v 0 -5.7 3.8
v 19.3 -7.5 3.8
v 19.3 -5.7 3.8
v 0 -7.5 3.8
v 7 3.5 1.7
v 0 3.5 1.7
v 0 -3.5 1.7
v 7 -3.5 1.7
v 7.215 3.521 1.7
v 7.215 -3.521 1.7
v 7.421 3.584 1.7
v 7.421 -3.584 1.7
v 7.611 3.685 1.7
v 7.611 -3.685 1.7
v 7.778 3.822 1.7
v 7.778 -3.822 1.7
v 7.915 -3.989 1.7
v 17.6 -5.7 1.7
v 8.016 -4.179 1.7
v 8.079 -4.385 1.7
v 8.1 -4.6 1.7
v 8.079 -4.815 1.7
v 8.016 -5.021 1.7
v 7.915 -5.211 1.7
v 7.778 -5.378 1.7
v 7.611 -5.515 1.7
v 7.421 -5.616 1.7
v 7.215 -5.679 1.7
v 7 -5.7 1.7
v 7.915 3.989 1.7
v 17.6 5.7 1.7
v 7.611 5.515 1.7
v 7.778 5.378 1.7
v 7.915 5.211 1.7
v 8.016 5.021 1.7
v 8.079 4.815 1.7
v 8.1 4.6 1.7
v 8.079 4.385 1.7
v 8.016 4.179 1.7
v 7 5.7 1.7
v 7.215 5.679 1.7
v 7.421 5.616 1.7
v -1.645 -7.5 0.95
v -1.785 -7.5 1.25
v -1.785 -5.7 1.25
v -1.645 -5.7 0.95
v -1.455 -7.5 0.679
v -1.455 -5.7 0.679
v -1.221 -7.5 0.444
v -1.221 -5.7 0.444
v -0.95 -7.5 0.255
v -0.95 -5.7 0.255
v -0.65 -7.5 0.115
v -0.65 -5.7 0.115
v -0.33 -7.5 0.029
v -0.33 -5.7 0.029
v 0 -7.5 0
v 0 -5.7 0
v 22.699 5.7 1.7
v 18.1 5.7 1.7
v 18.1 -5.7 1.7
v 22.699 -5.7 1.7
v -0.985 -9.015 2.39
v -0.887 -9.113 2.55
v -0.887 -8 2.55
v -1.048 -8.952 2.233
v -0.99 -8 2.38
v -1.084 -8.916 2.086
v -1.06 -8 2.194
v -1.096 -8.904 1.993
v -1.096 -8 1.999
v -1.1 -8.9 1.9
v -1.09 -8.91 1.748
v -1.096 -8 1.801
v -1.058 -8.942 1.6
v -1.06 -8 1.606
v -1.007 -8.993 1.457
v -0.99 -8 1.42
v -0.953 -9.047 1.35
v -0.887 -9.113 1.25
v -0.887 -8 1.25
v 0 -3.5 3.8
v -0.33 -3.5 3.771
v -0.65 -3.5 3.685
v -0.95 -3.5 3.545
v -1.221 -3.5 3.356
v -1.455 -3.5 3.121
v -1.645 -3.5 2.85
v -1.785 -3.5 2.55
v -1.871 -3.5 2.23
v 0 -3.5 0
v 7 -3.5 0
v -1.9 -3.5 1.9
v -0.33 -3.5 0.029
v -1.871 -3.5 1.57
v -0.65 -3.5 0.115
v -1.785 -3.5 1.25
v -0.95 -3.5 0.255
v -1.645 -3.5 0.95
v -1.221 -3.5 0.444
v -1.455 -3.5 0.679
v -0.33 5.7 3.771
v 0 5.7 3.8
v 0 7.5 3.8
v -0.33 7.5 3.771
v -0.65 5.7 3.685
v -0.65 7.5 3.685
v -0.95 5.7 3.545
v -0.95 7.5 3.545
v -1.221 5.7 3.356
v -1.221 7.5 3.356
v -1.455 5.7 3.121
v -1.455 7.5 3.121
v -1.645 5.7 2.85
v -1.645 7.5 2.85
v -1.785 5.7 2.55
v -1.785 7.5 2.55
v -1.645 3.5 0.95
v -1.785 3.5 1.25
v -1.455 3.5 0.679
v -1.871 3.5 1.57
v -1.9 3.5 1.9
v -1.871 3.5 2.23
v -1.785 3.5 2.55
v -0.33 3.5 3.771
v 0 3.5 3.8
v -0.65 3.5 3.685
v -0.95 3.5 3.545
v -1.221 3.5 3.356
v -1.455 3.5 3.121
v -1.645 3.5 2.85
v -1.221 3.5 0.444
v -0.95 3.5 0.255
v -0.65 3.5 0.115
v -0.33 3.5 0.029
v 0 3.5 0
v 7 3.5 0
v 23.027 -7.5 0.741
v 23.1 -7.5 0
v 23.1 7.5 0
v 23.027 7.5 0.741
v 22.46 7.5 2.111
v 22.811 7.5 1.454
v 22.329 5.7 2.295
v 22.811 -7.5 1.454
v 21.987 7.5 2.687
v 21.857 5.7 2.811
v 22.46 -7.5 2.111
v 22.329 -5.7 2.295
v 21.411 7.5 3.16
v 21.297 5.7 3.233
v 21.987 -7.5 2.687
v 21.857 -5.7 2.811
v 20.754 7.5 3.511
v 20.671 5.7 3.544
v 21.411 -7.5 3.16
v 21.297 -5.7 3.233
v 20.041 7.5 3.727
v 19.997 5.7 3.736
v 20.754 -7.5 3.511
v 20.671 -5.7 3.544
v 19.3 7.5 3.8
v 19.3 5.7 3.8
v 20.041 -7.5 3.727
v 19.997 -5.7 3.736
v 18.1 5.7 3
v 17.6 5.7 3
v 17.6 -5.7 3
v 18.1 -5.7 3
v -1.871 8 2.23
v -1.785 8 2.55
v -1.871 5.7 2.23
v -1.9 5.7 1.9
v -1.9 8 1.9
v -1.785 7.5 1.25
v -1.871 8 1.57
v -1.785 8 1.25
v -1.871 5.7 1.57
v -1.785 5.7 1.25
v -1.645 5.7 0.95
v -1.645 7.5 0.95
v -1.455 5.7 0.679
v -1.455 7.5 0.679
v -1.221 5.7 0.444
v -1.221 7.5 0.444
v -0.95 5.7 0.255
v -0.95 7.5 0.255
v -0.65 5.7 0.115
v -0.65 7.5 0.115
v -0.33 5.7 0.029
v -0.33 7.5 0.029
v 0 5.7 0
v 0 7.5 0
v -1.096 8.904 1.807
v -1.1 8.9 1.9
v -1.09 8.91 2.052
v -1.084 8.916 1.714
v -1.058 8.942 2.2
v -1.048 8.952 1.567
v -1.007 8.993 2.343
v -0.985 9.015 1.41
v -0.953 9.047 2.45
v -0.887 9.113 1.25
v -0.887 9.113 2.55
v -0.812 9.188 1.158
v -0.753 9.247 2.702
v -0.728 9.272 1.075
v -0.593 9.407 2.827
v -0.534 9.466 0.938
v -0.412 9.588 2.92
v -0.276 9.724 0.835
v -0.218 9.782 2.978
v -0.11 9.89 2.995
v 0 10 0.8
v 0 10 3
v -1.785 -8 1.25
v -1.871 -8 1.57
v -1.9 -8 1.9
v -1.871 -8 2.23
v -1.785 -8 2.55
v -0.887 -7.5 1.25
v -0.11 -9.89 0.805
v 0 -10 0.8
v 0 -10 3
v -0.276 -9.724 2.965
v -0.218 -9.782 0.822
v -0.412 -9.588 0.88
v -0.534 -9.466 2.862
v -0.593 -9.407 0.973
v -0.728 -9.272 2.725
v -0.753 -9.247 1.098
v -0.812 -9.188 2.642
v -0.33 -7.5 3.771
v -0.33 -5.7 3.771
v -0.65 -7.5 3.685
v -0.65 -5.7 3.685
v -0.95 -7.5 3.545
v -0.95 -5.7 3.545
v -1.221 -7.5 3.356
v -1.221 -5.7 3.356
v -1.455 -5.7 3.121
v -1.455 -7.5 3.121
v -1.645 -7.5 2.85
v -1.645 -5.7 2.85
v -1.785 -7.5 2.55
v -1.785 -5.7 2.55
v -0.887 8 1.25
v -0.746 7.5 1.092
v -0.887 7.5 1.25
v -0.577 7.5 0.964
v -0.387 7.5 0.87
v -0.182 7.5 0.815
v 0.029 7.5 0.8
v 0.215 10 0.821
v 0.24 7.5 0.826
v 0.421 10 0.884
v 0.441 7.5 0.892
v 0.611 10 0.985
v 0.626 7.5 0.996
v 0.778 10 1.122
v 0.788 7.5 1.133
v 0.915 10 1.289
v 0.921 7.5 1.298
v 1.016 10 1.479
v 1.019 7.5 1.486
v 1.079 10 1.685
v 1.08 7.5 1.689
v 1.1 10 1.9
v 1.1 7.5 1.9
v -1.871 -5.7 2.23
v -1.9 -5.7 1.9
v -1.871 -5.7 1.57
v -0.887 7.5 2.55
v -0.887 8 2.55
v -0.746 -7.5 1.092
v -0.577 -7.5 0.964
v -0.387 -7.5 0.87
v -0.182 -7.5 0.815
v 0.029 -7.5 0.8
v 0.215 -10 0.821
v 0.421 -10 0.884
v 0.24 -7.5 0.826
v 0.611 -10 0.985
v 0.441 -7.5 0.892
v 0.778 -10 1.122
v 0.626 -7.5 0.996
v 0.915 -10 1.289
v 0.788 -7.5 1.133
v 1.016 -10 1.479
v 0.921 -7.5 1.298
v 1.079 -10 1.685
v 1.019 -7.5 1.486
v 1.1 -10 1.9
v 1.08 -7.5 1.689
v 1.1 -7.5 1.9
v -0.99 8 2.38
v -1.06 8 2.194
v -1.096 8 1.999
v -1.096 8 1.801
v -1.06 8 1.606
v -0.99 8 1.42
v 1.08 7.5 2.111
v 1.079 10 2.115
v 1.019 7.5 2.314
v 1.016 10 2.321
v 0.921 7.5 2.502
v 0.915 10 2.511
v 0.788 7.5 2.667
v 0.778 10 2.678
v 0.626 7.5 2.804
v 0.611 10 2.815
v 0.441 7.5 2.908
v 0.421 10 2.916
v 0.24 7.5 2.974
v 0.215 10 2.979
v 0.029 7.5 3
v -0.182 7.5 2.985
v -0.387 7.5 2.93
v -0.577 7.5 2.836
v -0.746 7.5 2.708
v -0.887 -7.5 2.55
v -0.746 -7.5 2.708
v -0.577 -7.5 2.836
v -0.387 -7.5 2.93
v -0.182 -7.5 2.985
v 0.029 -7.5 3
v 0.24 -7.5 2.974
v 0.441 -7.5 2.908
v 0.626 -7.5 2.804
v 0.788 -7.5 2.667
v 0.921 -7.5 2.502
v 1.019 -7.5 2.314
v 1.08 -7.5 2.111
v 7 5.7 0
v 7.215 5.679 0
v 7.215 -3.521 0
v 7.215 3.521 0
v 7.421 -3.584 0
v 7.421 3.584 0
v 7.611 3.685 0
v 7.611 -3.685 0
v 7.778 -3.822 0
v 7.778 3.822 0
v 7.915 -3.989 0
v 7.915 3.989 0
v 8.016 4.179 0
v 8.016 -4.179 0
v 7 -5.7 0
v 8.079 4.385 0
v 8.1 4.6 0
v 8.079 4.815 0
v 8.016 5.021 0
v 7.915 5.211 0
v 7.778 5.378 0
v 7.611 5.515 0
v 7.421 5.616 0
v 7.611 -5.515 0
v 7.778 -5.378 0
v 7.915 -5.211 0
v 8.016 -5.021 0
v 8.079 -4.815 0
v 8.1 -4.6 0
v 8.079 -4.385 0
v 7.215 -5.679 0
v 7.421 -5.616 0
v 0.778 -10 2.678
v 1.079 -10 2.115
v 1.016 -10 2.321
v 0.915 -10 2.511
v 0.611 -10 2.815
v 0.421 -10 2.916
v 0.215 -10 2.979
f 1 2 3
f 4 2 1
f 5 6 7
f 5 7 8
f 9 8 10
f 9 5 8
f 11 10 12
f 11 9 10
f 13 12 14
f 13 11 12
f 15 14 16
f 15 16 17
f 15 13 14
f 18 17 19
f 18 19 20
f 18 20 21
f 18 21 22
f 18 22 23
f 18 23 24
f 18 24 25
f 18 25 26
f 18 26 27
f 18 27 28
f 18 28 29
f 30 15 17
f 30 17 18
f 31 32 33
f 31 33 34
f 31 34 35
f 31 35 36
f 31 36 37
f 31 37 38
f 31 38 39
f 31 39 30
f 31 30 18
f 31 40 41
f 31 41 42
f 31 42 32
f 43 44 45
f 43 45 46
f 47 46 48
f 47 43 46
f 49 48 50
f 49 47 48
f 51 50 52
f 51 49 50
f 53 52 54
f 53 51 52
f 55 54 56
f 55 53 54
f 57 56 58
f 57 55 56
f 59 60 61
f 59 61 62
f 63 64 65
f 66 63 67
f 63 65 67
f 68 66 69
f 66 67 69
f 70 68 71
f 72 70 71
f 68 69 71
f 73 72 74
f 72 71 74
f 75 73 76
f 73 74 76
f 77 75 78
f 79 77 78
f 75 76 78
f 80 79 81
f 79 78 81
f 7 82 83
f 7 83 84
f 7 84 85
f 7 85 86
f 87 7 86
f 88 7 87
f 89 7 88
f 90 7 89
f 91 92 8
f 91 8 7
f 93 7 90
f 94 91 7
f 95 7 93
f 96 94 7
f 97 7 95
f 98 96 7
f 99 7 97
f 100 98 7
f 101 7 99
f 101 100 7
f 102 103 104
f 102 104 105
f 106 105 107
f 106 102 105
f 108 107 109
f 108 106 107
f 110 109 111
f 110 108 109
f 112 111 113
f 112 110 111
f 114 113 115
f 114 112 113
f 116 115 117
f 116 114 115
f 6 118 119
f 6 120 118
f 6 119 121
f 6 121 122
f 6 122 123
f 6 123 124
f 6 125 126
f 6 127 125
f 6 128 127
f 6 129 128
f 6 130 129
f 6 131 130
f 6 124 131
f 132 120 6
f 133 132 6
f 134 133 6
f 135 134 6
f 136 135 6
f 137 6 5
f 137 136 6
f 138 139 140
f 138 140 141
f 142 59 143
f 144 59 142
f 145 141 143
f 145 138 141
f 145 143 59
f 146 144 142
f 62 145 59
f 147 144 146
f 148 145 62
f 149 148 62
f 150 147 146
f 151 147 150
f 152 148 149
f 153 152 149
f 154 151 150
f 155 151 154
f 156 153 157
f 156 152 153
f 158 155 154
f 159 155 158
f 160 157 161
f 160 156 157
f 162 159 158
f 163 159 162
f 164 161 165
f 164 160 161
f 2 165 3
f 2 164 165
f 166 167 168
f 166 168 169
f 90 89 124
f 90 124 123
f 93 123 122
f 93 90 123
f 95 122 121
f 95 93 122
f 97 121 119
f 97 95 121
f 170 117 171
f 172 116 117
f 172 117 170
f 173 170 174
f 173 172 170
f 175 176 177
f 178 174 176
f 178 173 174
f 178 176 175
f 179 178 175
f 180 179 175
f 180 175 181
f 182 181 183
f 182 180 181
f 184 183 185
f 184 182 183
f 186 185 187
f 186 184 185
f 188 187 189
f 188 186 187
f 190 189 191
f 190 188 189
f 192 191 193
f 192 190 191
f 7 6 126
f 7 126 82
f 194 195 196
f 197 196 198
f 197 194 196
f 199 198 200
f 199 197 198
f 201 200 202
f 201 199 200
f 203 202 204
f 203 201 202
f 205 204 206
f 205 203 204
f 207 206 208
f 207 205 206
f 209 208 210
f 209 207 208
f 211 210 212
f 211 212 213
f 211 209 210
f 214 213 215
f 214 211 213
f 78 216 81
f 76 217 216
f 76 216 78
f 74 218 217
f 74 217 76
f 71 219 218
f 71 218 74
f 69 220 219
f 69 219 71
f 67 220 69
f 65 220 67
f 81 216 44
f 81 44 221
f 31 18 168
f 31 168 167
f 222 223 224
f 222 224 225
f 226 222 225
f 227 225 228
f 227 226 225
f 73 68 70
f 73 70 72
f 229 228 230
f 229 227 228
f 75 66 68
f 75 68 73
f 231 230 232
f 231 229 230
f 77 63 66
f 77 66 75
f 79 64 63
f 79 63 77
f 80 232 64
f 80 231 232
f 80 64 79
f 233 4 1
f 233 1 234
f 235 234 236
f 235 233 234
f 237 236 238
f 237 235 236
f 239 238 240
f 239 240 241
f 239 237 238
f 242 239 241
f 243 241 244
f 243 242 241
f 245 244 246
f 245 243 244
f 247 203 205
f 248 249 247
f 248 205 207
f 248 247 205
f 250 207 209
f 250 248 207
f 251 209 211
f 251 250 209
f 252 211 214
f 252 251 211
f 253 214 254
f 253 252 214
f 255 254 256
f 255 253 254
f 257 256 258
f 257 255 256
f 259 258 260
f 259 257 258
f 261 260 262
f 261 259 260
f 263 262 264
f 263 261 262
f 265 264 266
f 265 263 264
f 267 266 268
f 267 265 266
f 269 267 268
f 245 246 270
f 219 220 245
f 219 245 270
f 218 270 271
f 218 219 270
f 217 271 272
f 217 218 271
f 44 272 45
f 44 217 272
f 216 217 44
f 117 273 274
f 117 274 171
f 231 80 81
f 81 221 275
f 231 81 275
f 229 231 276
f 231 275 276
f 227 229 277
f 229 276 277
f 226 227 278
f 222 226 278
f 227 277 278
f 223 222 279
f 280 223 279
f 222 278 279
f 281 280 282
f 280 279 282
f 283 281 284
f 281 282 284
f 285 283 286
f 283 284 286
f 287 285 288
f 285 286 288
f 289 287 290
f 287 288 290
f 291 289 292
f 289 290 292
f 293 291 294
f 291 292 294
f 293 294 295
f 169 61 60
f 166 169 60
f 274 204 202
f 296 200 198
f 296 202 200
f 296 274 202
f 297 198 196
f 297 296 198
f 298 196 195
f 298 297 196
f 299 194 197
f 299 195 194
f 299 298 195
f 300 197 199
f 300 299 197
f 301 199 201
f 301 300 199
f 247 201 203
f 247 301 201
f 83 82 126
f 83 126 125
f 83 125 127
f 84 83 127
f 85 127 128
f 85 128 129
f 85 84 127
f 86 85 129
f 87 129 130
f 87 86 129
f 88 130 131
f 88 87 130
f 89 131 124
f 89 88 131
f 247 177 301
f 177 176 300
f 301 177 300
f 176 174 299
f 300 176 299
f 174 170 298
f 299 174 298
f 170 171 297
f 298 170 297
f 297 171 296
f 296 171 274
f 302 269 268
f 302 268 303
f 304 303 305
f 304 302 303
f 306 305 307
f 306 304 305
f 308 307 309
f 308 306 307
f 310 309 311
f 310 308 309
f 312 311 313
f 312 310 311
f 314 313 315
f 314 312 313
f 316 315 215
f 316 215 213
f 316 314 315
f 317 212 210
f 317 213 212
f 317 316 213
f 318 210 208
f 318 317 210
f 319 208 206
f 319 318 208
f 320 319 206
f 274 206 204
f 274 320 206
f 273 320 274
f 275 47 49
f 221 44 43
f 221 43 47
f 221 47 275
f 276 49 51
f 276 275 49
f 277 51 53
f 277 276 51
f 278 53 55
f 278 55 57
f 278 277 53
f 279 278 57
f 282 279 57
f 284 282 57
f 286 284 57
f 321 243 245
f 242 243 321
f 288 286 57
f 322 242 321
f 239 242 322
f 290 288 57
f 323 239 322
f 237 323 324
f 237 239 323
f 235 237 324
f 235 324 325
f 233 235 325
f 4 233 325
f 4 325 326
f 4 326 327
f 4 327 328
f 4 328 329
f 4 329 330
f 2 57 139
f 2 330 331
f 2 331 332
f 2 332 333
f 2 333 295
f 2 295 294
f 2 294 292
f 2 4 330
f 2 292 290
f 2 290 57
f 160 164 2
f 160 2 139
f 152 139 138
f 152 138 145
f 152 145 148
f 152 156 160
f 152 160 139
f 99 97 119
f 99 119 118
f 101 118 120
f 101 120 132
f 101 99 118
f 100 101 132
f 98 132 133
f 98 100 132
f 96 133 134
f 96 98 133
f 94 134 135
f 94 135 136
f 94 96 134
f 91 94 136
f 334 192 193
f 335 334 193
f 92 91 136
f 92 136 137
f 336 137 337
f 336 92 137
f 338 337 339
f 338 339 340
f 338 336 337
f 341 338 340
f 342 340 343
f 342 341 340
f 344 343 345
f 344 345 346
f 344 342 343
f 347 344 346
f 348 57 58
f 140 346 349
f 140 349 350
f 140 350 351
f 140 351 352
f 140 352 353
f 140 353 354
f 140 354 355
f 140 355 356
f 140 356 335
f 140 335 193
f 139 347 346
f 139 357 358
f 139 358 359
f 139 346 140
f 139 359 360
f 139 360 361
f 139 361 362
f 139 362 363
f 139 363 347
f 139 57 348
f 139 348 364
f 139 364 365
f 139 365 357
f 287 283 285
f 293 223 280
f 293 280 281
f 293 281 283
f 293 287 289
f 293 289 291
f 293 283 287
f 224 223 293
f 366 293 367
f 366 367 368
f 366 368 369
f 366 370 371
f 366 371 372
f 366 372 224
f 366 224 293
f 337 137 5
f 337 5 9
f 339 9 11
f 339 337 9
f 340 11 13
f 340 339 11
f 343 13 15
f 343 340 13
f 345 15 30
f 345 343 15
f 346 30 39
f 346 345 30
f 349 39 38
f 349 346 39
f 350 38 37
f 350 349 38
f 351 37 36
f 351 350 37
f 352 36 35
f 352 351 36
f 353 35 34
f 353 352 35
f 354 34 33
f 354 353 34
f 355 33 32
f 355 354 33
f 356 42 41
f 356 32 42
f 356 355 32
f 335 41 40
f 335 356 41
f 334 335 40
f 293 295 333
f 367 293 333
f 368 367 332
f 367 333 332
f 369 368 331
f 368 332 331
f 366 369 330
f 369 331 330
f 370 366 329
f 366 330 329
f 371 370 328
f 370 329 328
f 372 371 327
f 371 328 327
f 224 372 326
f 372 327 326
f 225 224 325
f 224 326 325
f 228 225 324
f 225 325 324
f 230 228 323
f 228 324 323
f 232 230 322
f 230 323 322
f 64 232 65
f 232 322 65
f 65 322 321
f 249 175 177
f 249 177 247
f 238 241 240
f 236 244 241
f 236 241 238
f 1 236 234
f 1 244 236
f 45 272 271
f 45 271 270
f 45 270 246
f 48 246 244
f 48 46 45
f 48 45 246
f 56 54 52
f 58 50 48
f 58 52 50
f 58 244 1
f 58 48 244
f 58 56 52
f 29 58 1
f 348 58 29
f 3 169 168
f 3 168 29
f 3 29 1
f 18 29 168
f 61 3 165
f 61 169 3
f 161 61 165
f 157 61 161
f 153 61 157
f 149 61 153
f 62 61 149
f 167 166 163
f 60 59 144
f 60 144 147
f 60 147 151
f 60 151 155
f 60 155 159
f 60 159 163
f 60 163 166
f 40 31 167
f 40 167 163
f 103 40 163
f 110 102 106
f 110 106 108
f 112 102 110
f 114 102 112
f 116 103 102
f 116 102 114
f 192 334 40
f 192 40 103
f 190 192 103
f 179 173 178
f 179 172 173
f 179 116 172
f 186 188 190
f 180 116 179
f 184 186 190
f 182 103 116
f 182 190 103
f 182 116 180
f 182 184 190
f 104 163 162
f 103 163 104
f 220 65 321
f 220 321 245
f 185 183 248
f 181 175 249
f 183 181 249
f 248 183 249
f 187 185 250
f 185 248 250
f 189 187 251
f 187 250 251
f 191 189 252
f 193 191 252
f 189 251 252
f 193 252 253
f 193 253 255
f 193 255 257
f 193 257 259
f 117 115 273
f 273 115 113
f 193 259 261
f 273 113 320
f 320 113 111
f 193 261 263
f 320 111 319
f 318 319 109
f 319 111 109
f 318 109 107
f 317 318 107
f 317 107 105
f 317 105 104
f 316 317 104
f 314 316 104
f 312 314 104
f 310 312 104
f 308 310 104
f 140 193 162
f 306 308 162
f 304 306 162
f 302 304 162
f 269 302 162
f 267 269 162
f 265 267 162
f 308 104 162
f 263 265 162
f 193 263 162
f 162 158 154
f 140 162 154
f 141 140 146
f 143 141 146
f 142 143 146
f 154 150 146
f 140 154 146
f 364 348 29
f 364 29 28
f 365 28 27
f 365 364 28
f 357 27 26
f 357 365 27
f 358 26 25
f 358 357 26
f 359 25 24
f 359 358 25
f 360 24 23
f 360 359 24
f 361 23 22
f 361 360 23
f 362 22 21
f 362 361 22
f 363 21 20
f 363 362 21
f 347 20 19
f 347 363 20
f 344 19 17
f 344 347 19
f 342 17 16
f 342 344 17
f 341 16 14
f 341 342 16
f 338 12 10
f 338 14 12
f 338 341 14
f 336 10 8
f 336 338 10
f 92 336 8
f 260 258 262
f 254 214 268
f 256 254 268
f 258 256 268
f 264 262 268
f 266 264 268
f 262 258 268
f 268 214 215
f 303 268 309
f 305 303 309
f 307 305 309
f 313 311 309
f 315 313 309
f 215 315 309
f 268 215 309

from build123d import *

# Parameters (mm, degrees)
F1_DEPTH = 7.5
F2_DEPTH = 10
F3_DEPTH = 8
F4_W     = 1.9
F4_H     = 2.2
F5_DEPTH = 3.801
F6_START = 1.7
F4_W_2   = 5
F4_H_2   = 11.4
F6_DEPTH = 2.101
F7_START = 3
F4_W_3   = 0.5
F7_DEPTH = 0.8
F8_DEPTH = 25


with BuildPart() as f1:
    # F0 (on Front) → F1 (new body, symmetric)
    with BuildSketch(Plane.XZ):
        with BuildLine():
            ThreePointArc((1.9, 1.9), (1.3435028843, 0.5564971157), (0, 0))
            Line((0, 0), (23.1, 0))
            ThreePointArc((23.1, 0), (21.9870057685, 2.6870057685), (19.3, 3.8))
            Line((19.3, 3.8), (0, 3.8))
            ThreePointArc((0, 3.8), (1.3435028843, 3.2435028843), (1.9, 1.9))
        make_face()
        with BuildLine():
            ThreePointArc((-1.7853571071, 1.25), (-1.0897247359, 0.3435617584), (0, 0))
            ThreePointArc((0, 0), (1.3435028843, 0.5564971157), (1.9, 1.9))
            ThreePointArc((1.9, 1.9), (1.3435028843, 3.2435028843), (0, 3.8))
            ThreePointArc((0, 3.8), (-1.0897247359, 3.4564382416), (-1.7853571071, 2.55))
            Line((-1.7853571071, 2.55), (-0.8874119675, 2.55))
            ThreePointArc((-0.8874119675, 2.55), (0.3419406643, 2.9455030283), (1.1, 1.9))
            ThreePointArc((1.1, 1.9), (0.3419406643, 0.8544969717), (-0.8874119675, 1.25))
            Line((-0.8874119675, 1.25), (-1.7853571071, 1.25))
        make_face()
        with BuildLine():
            ThreePointArc((-1.7853571071, 2.55), (-1.9, 1.9), (-1.7853571071, 1.25))
            Line((-1.7853571071, 1.25), (-0.8874119675, 1.25))
            ThreePointArc((-0.8874119675, 1.25), (-1.1, 1.9), (-0.8874119675, 2.55))
            Line((-0.8874119675, 2.55), (-1.7853571071, 2.55))
        make_face()
    extrude(amount=F1_DEPTH, both=True)

    # F0 (on Front) → F2 (join, symmetric)
    with BuildSketch(Plane.XZ):
        with BuildLine():
            ThreePointArc((-0.8874119675, 2.55), (-1.1, 1.9), (-0.8874119675, 1.25))
            ThreePointArc((-0.8874119675, 1.25), (0.3419406643, 0.8544969717), (1.1, 1.9))
            ThreePointArc((1.1, 1.9), (0.3419406643, 2.9455030283), (-0.8874119675, 2.55))
        make_face()
    extrude(amount=F2_DEPTH, both=True)

    # F0 (on Front) → F3 (join, symmetric)
    with BuildSketch(Plane.XZ):
        with BuildLine():
            ThreePointArc((-1.7853571071, 2.55), (-1.9, 1.9), (-1.7853571071, 1.25))
            Line((-1.7853571071, 1.25), (-0.8874119675, 1.25))
            ThreePointArc((-0.8874119675, 1.25), (-1.1, 1.9), (-0.8874119675, 2.55))
            Line((-0.8874119675, 2.55), (-1.7853571071, 2.55))
        make_face()
    extrude(amount=F3_DEPTH, both=True)

    # F4 (on Top) → F5 (cut, through all)
    with BuildSketch(Plane.XY):
        with Locations((-0.95, 4.6)):
            Rectangle(F4_W, F4_H)
        with BuildLine():
            Line((0, 5.7), (0, 3.5))
            Line((0, 3.5), (7, 3.5))
            ThreePointArc((7, 3.5), (8.1, 4.6), (7, 5.7))
            Line((7, 5.7), (0, 5.7))
        make_face()
        with Locations((-0.95, -4.6)):
            Rectangle(F4_W, F4_H)
        with BuildLine():
            Line((0, -3.5), (0, -5.7))
            Line((0, -5.7), (7, -5.7))
            ThreePointArc((7, -5.7), (8.1, -4.6), (7, -3.5))
            Line((7, -3.5), (0, -3.5))
        make_face()
    extrude(amount=F5_DEPTH, mode=Mode.SUBTRACT)

    # F4 (on Top) → F6 (cut)
    with BuildSketch(Plane.XY.offset(F6_START)):
        with BuildLine():
            ThreePointArc((7, -3.5), (8.1, -4.6), (7, -5.7))
            Line((7, -5.7), (17.6, -5.7))
            Line((17.6, -5.7), (17.6, 5.7))
            Line((17.6, 5.7), (7, 5.7))
            ThreePointArc((7, 5.7), (8.1, 4.6), (7, 3.5))
            Line((7, 3.5), (0, 3.5))
            Line((0, 3.5), (0, -3.5))
            Line((0, -3.5), (7, -3.5))
        make_face()
        with Locations((20.6, 0)):
            Rectangle(F4_W_2, F4_H_2)
    extrude(amount=F6_DEPTH, mode=Mode.SUBTRACT)

    # F4 (on Top) → F7 (cut)
    with BuildSketch(Plane.XY.offset(F7_START)):
        with Locations((17.85, 0)):
            Rectangle(F4_W_3, F4_H_2)
    extrude(amount=F7_DEPTH, mode=Mode.SUBTRACT)

    # F4 (on Top) → F8 (cut)
    with BuildSketch(Plane.XY):
        Polygon((-1.1, 8.9), (0, 10), (-1.1, 10), align=None)
        Polygon((0, -10), (-1.1, -8.9), (-1.1, -10), align=None)
    extrude(amount=F8_DEPTH, mode=Mode.SUBTRACT)


solid = f1.part
